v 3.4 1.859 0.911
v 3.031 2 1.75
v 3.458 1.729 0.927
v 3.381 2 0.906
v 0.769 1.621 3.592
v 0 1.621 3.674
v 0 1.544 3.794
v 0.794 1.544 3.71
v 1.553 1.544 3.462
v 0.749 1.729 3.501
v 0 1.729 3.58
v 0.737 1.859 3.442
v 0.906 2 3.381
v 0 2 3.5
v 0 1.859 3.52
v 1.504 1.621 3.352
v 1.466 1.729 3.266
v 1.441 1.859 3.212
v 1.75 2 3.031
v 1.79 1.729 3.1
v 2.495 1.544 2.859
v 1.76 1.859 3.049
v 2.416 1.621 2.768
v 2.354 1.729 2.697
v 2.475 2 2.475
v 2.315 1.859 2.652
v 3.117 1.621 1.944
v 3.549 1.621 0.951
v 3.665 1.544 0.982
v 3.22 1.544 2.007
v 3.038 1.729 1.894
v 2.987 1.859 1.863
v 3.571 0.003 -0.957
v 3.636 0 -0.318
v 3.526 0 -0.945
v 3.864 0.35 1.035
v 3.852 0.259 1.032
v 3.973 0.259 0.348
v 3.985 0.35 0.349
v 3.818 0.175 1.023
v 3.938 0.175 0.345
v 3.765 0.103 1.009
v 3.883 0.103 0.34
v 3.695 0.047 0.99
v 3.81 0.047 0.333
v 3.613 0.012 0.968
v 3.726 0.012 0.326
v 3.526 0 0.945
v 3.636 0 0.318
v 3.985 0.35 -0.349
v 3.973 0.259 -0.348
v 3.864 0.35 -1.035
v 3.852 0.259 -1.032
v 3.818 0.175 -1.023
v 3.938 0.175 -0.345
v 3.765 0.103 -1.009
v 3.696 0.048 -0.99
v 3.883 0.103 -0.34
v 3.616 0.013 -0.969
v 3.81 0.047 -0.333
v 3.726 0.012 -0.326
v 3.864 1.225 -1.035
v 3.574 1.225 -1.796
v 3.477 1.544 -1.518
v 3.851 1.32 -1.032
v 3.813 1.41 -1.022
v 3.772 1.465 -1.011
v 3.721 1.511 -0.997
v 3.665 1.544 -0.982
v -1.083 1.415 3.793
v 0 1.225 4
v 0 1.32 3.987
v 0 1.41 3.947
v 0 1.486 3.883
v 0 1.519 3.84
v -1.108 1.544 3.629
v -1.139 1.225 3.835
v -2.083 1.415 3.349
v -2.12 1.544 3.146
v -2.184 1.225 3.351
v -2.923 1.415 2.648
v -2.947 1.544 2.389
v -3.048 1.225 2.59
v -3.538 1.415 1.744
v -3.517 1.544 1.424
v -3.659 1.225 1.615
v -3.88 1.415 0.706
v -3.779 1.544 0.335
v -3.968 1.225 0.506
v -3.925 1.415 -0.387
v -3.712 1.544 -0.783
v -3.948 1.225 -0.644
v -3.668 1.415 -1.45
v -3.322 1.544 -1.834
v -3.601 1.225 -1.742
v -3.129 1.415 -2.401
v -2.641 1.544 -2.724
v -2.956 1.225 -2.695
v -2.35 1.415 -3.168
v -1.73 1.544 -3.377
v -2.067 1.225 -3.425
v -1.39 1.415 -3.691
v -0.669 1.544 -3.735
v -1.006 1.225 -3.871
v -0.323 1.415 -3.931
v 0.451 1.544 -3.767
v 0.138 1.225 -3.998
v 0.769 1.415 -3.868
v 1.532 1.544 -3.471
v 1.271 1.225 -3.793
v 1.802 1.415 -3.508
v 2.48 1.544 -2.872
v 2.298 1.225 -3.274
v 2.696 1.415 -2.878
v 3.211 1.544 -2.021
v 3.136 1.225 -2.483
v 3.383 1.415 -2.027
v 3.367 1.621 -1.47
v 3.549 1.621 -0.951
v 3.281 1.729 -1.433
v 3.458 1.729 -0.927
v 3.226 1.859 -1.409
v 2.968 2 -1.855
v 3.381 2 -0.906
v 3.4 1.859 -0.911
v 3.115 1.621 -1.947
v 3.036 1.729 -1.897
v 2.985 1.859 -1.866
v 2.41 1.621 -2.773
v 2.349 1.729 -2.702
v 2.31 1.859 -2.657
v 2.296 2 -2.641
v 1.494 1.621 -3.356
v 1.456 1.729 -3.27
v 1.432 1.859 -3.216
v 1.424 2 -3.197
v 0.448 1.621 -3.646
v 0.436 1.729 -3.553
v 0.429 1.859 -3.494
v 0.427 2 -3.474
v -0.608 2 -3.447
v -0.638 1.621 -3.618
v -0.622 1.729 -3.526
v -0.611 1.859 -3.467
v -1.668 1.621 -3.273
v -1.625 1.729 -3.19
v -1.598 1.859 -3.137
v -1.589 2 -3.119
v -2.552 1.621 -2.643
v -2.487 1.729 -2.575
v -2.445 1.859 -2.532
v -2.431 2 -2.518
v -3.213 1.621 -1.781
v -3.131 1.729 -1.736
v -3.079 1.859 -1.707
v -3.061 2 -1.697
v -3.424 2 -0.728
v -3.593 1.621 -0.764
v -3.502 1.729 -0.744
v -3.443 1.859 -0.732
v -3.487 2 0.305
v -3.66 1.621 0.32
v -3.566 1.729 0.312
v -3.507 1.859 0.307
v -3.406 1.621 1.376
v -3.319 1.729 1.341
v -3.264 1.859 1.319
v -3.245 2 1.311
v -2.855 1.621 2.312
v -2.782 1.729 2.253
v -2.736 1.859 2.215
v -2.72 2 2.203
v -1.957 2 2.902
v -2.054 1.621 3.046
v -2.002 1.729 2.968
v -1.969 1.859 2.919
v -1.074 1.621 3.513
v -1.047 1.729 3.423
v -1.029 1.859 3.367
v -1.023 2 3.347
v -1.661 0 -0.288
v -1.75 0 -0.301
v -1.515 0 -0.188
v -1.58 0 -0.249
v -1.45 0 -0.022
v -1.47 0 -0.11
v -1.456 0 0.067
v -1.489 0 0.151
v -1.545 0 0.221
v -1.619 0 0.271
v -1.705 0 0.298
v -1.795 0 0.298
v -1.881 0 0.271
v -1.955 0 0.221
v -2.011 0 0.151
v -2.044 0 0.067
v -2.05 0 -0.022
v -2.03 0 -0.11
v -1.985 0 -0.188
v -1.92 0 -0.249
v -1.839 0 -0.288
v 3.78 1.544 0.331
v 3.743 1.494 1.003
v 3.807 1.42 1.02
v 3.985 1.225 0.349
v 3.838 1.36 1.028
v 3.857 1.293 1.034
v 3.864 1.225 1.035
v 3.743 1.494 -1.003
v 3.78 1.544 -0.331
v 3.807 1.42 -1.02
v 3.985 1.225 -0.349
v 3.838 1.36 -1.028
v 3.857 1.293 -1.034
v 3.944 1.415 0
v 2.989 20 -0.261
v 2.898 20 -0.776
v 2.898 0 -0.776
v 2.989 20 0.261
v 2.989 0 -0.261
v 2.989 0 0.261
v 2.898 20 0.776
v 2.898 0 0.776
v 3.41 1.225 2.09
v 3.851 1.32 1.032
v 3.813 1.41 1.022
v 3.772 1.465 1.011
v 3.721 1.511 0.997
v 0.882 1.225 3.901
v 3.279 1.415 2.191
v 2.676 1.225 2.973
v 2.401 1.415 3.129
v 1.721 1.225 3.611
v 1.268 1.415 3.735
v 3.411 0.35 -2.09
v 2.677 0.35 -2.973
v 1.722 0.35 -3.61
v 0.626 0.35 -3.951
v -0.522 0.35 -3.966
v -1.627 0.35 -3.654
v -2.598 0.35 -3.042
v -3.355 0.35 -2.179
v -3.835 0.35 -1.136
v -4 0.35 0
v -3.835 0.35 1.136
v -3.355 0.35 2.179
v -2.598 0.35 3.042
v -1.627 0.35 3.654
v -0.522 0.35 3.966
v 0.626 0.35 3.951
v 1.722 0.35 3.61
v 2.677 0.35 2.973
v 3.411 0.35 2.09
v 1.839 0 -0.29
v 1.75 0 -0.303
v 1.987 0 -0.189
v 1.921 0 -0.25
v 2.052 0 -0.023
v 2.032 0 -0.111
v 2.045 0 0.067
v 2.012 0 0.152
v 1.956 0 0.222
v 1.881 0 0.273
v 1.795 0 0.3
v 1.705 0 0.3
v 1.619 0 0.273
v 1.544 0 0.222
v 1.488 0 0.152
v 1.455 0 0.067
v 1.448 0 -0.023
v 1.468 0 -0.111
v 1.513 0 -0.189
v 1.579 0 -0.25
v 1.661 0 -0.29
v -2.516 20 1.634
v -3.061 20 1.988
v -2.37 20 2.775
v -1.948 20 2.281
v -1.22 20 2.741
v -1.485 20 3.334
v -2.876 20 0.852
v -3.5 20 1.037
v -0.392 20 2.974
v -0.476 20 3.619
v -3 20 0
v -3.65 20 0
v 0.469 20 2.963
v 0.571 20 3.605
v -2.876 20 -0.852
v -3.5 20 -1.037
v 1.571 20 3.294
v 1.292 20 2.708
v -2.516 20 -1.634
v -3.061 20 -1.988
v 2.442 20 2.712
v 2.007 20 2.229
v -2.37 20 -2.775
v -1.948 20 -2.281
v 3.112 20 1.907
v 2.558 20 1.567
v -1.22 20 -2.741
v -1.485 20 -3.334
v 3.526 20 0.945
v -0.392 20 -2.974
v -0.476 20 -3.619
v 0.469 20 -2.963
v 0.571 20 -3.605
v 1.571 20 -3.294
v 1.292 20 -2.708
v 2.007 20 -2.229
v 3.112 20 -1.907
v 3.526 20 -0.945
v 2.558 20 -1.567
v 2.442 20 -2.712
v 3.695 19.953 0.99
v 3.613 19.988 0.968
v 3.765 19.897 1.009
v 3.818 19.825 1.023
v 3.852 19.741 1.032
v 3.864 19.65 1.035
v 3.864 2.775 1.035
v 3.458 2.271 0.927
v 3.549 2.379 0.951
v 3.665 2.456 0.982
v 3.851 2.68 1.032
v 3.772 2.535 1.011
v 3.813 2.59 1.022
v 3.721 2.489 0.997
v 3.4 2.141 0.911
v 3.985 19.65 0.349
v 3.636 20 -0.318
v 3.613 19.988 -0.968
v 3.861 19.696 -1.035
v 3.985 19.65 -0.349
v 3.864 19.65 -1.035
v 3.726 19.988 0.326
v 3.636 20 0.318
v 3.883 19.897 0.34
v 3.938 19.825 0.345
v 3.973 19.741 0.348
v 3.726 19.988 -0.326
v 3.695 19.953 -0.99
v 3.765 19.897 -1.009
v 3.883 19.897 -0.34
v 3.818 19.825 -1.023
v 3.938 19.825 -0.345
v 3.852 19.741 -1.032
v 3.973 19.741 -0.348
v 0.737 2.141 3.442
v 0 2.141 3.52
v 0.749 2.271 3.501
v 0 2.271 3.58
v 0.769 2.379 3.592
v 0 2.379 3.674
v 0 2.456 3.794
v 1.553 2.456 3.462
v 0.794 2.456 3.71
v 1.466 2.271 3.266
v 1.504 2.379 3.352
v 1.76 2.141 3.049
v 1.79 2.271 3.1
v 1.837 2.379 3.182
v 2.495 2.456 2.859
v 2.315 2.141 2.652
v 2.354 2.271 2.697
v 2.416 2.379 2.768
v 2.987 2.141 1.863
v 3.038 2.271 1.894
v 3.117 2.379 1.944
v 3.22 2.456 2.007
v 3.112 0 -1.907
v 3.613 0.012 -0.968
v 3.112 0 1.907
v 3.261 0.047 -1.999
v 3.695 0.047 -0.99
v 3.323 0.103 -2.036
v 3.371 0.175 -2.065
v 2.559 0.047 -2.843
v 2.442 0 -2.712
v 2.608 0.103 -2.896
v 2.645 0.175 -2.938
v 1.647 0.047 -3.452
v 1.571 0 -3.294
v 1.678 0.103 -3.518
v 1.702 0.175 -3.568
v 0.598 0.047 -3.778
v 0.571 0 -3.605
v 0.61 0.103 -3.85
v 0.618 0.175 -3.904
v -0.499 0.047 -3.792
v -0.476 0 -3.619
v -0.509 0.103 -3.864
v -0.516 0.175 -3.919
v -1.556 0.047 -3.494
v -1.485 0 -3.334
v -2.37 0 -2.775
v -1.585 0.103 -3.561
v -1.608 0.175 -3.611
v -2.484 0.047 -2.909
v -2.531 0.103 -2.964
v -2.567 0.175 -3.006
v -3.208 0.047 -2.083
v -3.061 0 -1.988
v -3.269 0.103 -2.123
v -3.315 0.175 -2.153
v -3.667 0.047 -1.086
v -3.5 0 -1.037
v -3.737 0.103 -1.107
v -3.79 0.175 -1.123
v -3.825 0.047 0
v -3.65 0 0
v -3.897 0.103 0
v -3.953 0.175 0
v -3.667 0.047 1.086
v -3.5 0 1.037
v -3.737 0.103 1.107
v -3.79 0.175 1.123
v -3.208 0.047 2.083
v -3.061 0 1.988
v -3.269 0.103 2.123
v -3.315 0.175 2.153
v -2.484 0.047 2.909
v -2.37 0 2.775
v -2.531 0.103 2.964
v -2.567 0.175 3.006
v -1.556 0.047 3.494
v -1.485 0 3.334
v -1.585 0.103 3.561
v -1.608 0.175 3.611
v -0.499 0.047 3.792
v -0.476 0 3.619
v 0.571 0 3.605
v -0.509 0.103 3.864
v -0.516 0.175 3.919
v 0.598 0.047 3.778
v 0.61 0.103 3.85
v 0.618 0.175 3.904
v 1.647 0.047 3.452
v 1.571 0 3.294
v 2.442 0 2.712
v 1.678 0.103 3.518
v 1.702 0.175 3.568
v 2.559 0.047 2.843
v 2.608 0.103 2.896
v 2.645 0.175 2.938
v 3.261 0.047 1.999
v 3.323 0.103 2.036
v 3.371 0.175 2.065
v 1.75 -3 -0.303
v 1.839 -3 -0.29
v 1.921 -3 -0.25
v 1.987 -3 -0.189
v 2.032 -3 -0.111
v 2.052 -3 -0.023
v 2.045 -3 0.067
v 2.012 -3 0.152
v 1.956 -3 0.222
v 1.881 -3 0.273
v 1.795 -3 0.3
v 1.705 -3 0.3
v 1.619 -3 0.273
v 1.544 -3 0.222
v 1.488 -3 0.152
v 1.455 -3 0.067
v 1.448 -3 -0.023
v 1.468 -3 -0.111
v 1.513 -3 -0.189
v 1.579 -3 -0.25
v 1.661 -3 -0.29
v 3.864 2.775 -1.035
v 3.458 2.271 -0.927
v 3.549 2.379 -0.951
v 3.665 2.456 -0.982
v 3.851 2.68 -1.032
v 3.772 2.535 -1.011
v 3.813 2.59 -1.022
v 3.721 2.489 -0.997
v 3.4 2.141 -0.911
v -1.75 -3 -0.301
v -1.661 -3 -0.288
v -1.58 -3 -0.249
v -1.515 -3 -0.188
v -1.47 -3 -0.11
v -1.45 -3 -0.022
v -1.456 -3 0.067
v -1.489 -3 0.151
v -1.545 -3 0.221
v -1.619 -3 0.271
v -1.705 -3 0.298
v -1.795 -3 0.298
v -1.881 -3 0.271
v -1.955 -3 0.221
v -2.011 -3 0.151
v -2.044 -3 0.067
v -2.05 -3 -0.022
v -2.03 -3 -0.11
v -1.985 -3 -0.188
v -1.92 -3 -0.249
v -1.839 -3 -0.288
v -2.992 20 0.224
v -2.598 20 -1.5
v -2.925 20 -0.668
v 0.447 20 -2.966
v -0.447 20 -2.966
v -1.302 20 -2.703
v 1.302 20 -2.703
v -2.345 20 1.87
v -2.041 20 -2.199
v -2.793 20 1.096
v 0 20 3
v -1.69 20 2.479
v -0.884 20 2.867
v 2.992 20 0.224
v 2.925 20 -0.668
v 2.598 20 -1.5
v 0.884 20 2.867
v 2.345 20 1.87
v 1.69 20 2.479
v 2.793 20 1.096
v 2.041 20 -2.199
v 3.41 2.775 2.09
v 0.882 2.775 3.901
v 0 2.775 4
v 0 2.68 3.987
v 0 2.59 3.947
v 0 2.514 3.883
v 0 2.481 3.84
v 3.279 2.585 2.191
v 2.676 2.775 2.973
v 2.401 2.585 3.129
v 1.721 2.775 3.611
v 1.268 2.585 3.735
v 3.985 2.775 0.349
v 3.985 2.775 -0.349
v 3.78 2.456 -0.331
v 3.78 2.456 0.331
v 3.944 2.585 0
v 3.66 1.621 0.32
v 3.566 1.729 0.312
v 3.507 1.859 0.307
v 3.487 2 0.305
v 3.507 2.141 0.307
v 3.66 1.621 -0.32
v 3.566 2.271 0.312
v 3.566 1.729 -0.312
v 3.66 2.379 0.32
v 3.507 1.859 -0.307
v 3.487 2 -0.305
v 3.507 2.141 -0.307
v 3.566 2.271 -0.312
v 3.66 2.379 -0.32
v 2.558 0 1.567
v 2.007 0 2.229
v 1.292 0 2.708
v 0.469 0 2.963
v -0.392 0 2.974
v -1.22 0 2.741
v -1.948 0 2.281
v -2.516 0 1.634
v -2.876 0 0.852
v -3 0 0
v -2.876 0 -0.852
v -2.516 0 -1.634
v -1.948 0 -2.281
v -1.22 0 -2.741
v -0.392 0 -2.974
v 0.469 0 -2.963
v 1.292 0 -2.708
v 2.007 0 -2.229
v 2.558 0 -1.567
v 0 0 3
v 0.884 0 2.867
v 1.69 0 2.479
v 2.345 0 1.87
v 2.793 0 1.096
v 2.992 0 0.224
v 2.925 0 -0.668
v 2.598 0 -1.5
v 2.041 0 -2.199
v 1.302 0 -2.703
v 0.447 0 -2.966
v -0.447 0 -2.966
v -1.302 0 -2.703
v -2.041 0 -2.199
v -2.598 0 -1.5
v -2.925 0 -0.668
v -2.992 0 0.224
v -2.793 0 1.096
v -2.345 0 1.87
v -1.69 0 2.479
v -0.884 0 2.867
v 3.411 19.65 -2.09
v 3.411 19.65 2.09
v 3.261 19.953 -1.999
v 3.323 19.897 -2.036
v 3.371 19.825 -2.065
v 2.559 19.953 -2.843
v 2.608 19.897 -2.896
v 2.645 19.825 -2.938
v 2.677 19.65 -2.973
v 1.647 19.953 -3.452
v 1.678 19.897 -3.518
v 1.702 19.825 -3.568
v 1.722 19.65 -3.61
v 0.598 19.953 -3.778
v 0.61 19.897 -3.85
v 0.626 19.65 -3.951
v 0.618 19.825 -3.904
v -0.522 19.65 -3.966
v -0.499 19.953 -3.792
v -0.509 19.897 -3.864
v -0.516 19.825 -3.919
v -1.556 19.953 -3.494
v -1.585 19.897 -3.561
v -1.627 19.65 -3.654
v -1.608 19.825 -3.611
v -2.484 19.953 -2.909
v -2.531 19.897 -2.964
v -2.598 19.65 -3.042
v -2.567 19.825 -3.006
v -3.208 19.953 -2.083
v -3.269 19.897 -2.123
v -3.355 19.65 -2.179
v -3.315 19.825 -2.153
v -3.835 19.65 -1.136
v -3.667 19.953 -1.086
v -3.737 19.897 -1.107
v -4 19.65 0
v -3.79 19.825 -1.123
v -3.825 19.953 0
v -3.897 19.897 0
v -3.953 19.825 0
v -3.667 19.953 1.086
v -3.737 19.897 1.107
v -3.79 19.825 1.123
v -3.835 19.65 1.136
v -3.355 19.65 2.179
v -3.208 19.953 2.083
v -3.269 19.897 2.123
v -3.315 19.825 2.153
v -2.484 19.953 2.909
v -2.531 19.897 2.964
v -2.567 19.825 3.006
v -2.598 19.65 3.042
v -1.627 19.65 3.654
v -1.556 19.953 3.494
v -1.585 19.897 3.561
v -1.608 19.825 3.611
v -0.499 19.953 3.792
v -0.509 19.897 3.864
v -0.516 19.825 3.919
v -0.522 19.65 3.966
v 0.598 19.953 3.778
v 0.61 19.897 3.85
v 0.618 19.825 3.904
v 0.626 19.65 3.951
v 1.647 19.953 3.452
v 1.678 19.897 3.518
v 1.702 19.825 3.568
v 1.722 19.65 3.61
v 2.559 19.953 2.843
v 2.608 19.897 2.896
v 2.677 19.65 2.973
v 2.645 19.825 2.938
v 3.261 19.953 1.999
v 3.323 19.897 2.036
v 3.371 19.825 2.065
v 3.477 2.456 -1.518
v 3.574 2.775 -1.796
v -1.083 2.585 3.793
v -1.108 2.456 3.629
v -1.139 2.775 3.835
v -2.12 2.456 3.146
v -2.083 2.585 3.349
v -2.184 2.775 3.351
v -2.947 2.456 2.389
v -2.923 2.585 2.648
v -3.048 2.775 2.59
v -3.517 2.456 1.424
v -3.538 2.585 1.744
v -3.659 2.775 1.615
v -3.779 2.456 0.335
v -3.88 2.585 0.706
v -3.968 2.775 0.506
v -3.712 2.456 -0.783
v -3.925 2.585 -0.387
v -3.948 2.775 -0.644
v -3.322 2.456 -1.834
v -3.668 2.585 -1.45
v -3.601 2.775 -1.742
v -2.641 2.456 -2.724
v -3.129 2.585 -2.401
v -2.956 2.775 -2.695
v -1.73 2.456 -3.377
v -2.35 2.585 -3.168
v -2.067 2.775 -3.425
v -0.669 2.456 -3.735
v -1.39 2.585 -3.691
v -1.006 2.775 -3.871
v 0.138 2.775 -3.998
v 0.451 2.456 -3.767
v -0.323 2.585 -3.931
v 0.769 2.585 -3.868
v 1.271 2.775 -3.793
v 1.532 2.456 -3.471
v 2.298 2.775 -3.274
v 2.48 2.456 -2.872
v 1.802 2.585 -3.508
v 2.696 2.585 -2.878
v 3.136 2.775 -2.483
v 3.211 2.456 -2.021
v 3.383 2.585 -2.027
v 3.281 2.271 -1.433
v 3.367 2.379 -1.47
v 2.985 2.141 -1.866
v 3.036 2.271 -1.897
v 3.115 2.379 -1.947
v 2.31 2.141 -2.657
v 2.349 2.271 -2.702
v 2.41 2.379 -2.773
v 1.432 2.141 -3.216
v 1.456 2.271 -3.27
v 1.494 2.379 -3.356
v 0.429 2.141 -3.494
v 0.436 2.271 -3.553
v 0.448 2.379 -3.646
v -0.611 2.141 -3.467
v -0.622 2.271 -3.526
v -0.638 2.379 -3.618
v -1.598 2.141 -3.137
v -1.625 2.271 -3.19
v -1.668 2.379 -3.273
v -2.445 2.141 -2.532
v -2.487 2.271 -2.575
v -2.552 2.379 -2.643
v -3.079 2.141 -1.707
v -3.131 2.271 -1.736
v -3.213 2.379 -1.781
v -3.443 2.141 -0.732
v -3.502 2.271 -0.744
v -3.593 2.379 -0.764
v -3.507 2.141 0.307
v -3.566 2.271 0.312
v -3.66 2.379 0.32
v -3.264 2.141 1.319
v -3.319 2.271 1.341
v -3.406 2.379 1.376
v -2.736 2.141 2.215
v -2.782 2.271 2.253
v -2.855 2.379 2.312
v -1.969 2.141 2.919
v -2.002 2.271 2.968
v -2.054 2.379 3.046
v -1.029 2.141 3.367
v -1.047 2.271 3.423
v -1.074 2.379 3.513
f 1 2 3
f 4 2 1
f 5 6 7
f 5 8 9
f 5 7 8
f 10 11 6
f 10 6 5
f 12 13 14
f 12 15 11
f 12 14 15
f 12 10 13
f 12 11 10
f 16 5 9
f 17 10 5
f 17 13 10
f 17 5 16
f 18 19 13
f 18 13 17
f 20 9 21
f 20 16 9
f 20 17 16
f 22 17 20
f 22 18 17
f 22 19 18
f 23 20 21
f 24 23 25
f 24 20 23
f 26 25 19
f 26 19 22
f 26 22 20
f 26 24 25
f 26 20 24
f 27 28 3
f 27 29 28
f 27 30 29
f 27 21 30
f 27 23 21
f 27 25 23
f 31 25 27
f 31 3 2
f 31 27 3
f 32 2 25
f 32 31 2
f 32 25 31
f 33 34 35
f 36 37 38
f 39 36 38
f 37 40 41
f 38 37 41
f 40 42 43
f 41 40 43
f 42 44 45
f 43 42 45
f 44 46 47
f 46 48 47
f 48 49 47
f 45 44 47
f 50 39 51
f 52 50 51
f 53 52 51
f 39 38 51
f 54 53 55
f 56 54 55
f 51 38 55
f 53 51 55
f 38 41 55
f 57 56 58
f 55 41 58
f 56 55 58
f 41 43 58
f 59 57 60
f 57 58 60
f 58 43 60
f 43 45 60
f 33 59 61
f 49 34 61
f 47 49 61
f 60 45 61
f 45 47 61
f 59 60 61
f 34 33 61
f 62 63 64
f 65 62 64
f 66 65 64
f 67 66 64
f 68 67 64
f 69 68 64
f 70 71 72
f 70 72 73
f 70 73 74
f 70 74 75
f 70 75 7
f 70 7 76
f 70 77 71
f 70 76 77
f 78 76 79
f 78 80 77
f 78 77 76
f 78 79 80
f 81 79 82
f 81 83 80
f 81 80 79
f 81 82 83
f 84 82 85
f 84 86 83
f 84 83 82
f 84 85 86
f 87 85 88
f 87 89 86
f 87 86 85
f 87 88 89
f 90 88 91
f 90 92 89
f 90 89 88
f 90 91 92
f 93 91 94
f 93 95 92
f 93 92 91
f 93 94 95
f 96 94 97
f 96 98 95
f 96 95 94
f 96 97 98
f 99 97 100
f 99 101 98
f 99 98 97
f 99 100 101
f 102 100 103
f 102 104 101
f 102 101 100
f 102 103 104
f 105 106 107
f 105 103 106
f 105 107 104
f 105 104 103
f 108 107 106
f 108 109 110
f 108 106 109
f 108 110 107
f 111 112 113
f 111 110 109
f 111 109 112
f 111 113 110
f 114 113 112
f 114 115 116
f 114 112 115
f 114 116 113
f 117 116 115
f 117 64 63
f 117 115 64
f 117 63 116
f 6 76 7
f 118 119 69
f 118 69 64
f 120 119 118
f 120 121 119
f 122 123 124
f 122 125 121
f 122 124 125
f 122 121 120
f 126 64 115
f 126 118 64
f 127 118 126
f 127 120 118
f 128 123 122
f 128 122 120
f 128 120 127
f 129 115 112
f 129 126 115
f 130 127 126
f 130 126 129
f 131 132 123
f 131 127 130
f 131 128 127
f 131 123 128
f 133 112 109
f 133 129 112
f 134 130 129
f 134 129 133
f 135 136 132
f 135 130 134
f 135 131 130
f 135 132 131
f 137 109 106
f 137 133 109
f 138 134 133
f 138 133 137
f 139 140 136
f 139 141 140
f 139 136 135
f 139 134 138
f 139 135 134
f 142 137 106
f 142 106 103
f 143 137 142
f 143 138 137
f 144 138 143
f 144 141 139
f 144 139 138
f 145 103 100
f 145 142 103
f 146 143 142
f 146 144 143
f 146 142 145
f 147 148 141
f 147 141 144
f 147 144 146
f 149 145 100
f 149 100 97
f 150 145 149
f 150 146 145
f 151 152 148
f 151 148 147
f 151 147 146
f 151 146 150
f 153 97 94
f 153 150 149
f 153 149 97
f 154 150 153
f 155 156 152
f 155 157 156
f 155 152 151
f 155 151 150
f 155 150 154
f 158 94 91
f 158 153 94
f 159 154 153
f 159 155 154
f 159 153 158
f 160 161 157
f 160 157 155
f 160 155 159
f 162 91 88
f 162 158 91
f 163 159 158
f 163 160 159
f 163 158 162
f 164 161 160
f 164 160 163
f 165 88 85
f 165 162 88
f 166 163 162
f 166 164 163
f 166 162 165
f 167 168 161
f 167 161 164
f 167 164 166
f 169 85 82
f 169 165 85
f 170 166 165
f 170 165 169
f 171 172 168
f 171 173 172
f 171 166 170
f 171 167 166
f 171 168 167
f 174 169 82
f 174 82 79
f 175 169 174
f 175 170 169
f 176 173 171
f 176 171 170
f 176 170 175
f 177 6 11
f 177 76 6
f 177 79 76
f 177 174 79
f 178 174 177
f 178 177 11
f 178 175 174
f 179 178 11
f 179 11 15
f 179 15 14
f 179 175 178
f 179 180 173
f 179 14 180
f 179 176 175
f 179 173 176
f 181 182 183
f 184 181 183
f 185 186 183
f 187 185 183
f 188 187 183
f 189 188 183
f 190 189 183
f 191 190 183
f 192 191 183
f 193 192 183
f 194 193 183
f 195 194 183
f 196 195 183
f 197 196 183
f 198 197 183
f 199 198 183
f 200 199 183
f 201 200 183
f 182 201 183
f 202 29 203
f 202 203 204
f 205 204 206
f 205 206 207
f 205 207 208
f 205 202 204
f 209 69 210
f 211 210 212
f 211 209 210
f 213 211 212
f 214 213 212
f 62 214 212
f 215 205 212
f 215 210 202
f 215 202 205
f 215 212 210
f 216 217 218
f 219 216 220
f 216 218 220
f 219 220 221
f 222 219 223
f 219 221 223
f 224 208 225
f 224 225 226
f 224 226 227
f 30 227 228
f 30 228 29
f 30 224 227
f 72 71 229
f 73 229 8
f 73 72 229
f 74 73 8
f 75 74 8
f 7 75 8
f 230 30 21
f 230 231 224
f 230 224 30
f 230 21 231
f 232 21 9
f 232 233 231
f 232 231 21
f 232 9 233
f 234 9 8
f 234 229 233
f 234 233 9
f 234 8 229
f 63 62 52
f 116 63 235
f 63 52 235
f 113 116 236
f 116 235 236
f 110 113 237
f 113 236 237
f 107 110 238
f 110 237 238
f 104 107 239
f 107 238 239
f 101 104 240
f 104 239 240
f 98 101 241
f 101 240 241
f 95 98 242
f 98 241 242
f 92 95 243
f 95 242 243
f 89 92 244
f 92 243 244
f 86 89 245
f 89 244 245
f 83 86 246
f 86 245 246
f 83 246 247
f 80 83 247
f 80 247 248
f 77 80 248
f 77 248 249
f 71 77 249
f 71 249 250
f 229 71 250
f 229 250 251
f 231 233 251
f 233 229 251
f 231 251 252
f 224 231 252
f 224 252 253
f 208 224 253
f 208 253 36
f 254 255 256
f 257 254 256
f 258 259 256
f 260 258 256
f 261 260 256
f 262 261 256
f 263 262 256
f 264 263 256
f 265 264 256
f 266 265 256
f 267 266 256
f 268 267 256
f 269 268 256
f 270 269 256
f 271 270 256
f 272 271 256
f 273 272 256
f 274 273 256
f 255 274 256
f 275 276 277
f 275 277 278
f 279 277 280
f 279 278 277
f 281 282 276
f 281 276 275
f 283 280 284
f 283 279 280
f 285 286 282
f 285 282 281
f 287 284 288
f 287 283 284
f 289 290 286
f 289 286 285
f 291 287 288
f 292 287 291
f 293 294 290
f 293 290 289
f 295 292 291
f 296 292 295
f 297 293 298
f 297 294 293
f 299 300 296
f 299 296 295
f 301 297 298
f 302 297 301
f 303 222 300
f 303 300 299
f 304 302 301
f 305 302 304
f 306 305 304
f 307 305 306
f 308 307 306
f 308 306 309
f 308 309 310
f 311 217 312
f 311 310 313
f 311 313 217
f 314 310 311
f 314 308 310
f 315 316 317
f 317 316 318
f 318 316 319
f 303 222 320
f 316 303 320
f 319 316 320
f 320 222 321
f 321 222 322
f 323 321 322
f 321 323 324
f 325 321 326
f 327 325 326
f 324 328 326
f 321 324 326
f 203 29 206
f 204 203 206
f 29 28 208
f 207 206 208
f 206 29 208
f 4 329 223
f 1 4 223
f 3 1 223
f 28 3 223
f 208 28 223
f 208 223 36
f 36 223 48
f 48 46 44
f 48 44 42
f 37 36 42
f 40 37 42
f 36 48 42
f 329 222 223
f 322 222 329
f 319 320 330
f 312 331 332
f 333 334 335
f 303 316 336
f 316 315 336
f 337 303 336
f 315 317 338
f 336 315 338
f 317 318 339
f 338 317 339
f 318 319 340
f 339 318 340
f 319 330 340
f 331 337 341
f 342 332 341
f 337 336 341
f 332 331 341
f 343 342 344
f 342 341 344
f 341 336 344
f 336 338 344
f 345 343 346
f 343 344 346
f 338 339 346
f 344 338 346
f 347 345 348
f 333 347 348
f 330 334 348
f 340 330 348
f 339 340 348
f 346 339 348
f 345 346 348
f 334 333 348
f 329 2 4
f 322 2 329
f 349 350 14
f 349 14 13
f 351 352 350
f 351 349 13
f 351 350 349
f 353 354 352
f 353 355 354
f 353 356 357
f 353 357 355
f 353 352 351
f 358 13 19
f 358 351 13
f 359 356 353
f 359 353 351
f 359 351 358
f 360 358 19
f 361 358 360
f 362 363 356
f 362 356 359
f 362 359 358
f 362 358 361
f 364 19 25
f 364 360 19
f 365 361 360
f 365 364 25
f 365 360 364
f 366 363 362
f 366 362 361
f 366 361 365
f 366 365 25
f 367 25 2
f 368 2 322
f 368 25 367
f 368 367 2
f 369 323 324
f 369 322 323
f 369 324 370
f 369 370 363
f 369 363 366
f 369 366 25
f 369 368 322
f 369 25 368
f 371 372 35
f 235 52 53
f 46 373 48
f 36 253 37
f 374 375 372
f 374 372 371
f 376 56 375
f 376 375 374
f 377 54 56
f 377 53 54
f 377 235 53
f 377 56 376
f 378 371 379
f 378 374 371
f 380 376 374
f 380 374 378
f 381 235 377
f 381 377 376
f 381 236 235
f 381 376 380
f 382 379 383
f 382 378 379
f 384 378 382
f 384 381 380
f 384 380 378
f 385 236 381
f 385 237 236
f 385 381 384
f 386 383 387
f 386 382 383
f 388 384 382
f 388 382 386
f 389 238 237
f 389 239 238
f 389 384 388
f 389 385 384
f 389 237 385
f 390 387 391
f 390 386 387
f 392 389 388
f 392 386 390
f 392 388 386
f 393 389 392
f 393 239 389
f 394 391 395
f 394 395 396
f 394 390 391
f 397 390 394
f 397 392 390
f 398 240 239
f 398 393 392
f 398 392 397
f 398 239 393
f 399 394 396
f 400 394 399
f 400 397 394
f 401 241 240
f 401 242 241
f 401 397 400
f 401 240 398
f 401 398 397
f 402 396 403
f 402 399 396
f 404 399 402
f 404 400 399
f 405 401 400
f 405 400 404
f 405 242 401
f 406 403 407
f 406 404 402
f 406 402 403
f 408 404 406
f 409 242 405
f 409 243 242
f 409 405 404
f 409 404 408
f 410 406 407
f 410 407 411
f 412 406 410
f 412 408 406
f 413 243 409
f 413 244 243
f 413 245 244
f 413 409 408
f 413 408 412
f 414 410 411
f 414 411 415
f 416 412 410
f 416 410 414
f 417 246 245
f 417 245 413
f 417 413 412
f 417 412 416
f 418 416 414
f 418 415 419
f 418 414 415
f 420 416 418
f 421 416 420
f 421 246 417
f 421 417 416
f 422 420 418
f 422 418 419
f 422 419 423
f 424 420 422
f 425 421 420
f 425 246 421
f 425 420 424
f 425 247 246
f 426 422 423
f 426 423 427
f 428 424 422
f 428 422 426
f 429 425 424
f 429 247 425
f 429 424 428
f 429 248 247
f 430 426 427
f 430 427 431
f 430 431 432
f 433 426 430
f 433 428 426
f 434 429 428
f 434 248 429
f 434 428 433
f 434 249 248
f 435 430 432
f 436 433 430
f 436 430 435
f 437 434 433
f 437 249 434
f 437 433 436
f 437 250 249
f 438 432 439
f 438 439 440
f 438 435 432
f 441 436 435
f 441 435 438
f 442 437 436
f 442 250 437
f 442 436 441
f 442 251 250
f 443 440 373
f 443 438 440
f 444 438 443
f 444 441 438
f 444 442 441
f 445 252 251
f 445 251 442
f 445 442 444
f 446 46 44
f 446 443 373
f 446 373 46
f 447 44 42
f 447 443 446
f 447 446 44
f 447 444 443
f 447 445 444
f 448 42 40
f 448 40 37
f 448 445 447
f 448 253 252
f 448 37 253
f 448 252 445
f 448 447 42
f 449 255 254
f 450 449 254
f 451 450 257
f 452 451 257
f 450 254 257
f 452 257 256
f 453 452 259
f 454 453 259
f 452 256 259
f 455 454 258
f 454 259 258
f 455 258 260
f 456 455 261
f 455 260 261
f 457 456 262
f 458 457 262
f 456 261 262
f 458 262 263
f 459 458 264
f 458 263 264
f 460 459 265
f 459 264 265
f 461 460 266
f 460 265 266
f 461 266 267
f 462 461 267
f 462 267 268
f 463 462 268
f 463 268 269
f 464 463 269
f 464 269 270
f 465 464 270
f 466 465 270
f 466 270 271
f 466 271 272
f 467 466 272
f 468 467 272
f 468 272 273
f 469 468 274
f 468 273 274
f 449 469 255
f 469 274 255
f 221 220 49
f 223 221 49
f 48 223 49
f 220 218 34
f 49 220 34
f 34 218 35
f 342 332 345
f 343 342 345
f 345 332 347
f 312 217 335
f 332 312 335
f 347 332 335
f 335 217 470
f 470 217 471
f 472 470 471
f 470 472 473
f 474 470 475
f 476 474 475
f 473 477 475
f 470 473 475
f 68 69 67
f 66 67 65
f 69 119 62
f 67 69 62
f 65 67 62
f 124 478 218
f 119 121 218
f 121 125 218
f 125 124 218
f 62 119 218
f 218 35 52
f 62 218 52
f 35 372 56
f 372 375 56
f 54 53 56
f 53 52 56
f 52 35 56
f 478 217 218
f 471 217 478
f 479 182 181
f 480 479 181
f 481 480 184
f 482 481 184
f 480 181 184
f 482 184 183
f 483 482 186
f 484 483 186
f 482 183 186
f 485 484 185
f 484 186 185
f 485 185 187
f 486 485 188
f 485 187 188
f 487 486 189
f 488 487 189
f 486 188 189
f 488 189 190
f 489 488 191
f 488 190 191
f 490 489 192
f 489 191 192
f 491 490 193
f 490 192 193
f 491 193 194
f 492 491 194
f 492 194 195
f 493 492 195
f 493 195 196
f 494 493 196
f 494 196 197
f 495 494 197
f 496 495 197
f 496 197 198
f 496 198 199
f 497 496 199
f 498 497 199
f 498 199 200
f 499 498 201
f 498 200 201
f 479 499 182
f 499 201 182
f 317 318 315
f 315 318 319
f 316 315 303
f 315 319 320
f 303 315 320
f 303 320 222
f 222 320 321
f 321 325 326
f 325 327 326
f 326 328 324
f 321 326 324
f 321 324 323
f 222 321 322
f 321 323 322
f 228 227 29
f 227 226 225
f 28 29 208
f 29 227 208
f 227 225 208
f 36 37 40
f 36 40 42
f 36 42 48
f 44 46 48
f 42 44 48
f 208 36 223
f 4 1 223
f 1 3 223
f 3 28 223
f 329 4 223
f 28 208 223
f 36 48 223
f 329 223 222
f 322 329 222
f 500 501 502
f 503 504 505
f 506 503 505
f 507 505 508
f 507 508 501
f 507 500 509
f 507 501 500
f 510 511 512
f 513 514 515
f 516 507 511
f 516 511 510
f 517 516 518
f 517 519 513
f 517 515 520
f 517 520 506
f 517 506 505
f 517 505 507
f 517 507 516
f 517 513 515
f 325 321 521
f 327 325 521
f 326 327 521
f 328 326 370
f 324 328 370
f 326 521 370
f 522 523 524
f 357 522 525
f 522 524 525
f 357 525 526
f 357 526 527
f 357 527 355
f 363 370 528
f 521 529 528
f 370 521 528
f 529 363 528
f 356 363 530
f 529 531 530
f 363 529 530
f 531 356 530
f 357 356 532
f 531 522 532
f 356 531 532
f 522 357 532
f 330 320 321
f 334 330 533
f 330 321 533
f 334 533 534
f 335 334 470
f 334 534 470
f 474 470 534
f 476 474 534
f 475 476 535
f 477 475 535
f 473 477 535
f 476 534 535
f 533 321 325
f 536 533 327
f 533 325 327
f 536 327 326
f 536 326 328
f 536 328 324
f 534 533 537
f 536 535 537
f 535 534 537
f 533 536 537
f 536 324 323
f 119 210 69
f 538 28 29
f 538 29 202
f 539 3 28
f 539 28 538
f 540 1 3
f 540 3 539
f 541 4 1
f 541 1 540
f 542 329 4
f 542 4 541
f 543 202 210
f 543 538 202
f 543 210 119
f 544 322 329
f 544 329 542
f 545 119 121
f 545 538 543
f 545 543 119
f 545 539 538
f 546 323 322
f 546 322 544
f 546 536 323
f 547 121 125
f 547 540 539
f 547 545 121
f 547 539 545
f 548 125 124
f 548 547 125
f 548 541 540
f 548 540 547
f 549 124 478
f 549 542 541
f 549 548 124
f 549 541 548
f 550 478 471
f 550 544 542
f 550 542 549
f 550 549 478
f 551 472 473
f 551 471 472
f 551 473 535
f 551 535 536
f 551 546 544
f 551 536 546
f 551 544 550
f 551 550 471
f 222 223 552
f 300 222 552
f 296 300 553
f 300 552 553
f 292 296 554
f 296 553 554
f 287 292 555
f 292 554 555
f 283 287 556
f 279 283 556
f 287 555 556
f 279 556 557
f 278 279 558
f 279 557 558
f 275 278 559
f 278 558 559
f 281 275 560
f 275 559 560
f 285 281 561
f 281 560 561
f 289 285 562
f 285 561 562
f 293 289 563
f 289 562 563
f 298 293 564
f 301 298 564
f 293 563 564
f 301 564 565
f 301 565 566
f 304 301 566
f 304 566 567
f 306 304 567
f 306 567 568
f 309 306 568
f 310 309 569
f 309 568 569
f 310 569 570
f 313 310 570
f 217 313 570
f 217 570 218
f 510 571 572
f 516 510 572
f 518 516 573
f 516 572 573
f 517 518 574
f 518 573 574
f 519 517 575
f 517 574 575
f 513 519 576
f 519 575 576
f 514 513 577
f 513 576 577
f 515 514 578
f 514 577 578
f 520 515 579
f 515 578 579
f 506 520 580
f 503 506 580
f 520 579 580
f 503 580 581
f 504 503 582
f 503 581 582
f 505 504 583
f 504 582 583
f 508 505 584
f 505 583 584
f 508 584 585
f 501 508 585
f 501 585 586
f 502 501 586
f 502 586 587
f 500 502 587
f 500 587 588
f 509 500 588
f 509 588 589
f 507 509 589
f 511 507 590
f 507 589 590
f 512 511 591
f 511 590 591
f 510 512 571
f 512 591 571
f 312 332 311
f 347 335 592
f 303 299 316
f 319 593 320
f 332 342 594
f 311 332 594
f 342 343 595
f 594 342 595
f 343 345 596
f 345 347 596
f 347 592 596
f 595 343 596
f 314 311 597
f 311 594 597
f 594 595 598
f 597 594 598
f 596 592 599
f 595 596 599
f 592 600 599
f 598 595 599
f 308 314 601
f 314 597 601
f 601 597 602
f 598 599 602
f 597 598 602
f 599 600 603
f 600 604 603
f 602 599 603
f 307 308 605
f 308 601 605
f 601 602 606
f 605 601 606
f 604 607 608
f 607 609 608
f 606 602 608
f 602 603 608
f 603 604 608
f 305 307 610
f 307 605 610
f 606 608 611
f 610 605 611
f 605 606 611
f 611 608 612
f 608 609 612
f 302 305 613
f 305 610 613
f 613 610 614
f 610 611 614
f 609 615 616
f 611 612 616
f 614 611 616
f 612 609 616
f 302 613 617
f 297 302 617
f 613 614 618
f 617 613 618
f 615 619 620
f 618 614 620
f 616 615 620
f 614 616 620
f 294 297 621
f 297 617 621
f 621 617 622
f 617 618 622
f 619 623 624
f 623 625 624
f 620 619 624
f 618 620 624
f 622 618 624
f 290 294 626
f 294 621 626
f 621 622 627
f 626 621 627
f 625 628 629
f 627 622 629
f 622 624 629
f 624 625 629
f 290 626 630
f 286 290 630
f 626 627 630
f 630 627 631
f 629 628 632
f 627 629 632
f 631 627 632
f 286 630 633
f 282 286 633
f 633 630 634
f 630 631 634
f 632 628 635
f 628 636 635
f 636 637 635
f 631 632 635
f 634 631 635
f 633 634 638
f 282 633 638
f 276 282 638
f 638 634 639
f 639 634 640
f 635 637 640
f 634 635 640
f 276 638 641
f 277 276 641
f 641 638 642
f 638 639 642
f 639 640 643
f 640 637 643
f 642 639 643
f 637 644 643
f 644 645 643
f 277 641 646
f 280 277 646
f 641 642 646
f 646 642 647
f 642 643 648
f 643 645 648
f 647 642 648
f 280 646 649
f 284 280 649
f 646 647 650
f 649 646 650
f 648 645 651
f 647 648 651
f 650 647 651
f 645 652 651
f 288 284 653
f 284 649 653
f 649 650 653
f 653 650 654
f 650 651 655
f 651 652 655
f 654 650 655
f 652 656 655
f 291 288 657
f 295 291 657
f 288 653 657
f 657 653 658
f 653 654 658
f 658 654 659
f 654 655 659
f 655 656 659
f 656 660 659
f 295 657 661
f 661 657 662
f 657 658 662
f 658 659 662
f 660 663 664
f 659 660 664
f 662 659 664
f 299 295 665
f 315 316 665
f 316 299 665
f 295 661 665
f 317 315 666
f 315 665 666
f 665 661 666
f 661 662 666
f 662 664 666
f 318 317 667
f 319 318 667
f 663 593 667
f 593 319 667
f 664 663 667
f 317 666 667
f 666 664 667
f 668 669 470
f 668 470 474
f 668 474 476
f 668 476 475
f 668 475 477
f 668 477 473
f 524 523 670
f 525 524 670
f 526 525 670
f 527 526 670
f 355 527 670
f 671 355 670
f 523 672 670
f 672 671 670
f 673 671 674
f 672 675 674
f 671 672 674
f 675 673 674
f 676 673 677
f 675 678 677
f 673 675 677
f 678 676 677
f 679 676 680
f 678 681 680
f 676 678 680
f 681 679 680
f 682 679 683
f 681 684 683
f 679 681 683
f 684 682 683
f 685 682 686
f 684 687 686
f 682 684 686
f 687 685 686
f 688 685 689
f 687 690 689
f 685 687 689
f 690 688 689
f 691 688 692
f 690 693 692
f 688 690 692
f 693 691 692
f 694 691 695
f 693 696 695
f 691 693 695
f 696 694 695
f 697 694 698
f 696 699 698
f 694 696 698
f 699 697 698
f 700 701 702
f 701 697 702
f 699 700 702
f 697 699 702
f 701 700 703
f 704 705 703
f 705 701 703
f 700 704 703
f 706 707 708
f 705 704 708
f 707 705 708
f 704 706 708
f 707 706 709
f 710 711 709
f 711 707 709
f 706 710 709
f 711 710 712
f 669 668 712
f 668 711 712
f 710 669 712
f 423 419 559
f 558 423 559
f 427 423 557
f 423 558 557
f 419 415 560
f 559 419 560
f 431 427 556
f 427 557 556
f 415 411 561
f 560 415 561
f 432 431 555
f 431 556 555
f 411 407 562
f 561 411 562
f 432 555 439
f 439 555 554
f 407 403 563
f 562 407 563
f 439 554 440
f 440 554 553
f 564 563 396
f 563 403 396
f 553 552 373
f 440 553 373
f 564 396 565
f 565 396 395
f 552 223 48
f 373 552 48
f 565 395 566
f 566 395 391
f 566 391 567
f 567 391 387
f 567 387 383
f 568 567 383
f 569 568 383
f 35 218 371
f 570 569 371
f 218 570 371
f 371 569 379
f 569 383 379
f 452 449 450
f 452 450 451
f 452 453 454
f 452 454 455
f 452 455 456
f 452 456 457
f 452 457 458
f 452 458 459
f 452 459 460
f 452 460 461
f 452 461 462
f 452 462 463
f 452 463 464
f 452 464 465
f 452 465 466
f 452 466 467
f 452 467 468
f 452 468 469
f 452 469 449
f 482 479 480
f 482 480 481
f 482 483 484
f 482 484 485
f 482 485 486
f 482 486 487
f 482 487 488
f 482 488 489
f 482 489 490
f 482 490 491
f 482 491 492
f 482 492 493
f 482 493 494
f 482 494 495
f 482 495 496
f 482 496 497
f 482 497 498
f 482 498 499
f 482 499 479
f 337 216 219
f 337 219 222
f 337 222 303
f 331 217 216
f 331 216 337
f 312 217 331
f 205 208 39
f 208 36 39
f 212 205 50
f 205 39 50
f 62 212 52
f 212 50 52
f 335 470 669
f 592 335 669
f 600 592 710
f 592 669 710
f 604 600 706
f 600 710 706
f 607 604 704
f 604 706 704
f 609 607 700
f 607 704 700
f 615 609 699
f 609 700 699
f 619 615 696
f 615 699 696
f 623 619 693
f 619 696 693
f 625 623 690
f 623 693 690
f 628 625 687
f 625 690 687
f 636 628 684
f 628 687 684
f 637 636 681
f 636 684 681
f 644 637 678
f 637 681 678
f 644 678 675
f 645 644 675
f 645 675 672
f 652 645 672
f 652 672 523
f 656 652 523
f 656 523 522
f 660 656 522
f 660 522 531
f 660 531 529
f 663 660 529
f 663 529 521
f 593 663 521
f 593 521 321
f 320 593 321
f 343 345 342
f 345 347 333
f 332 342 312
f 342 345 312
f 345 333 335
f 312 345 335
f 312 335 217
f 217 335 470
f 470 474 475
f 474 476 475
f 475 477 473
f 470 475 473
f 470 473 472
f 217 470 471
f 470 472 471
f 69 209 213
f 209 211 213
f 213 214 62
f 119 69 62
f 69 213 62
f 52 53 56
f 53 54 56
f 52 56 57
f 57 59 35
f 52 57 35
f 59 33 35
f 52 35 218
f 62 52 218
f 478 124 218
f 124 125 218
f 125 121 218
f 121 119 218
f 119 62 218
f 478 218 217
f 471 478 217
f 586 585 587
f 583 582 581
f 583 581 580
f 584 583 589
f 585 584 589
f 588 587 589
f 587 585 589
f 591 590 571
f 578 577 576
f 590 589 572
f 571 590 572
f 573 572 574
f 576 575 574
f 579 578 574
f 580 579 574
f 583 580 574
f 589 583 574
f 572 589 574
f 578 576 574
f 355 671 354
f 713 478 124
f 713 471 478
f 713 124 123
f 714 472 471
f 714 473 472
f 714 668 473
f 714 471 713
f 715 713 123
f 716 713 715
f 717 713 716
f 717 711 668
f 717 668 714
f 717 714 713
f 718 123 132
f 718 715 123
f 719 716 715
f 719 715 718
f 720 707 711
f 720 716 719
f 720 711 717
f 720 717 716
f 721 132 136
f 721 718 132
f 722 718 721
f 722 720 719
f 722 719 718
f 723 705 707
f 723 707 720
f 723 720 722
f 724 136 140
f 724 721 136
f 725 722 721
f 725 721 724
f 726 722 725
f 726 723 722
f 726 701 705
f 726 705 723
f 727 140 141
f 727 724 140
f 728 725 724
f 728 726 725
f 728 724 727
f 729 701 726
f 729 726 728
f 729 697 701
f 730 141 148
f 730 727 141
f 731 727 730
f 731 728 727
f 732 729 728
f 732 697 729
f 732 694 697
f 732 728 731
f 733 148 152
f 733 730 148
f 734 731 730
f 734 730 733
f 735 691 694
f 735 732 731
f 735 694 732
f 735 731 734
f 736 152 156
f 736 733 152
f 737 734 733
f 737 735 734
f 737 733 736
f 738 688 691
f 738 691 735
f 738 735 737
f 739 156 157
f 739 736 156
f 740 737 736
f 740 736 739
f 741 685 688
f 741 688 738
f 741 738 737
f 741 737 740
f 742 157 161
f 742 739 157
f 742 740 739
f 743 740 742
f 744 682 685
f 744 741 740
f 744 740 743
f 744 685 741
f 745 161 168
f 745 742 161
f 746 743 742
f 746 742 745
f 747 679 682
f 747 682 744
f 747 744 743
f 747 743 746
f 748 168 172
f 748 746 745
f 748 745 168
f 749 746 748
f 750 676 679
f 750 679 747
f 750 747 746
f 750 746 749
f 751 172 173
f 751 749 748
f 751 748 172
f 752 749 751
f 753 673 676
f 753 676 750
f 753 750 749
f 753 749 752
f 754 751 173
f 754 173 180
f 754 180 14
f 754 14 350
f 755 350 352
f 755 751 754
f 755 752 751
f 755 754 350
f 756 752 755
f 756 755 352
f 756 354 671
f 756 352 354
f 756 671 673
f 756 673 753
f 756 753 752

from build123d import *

# Parameters (mm, degrees)
SALIENTE_EXTRUIR3_DEPTH   = 20
SALIENTE_EXTRUIR4_DEPTH   = 20
SALIENTE_EXTRUIR5_DEPTH   = 20
CROQUIS3_R                = 0.4999999999999999
REDONDEO1_R               = 0.35
REDONDEO2_R               = 0.35
CROQUIS4_R                = 0.30107653954551516
SALIENTE_EXTRUIR6_DEPTH   = 3
CROQUIS4_R_2              = 0.30302467240714076
SALIENTE_EXTRUIR6_2_DEPTH = 3


with BuildPart() as part:
    # Croquis1 → Saliente-Extruir3 (new body)
    with BuildSketch(Plane(origin=(0, 0, 0), x_dir=(1, 0, 0), z_dir=(0, 1, 0))):
        with BuildLine():
            Line((3.8637033051562724, 1.0352761804100858), (2.8977774788672046, 0.7764571353075645))
            ThreePointArc((2.897777478867204, 0.7764571353075644), (2.974334584121431, 0.3915785766601559), (3, 0))
            ThreePointArc((3, -7.3e-16), (2.974334584121431, -0.3915785766601577), (2.897777478867204, -0.7764571353075647))
            Line((2.8977774788672046, -0.7764571353075641), (3.8637033051562724, -1.0352761804100854))
            ThreePointArc((3.8637033051562724, -1.0352761804100863), (3.965779445495241, -0.5221047688802103), (4, -9.8e-16))
            ThreePointArc((4, 0), (3.9657794454952415, 0.5221047688802078), (3.8637033051562724, 1.0352761804100858))
        make_face()
    extrude(amount=SALIENTE_EXTRUIR3_DEPTH)


with BuildPart() as body_2:
    # Croquis1<5> → Saliente-Extruir4 (new body)
    with BuildSketch(Plane(origin=(0, 0, 0), x_dir=(1, 0, 0), z_dir=(0, 1, 0))):
        with BuildLine():
            ThreePointArc((3, 0), (2.974334584121431, 0.3915785766601559), (2.897777478867204, 0.7764571353075644))
            ThreePointArc((2.897777478867204, 0.7764571353075644), (-3, -9.6e-16), (2.897777478867205, -0.776457135307562))
            ThreePointArc((2.897777478867204, -0.7764571353075647), (2.974334584121431, -0.3915785766601577), (3, -7.3e-16))
        make_face()
    extrude(amount=SALIENTE_EXTRUIR4_DEPTH)


with BuildPart() as body_3:
    # Croquis1<6> → Saliente-Extruir5 (new body)
    with BuildSketch(Plane(origin=(0, 0, 0), x_dir=(1, 0, 0), z_dir=(0, 1, 0))):
        with BuildLine():
            ThreePointArc((2.897777478867205, -0.776457135307562), (-3, -9.6e-16), (2.897777478867204, 0.7764571353075644))
            Line((2.8977774788672046, 0.7764571353075645), (3.8637033051562724, 1.0352761804100858))
            ThreePointArc((3.8637033051562724, 1.0352761804100858), (-4, 4.9e-16), (3.8637033051562724, -1.0352761804100863))
            Line((3.8637033051562724, -1.0352761804100854), (2.8977774788672046, -0.7764571353075641))
        make_face()
    extrude(amount=SALIENTE_EXTRUIR5_DEPTH)


with BuildPart() as cortar_revoluci_n1_tool:
    # Croquis3 → Cortar-Revolución1 (revolve)
    with BuildSketch(Plane(origin=(0, 0, 0), x_dir=(0, 0, -1), z_dir=(1, 0, 0))):
        with Locations((-4, 1.9999999999999982)):
            Circle(CROQUIS3_R)
    revolve(axis=Axis((0, -1.7359986127882774, 0), (0, 1, 0)))


with BuildPart() as part_1:
    add(part.part)

    # Cortar-Revolución1: cut by cortar_revoluci_n1_tool
    add(cortar_revoluci_n1_tool.part, mode=Mode.SUBTRACT)

    # Redondeo2
    redondeo2_edges = [part_1.edges().sort_by_distance(p)[0] for p in [
        (4, 0, -4.7e-16),
        (3.999999999997482, 1.4999999999999982, -7.0699e-12),
        (3.999999999997482, 2.4999999999999982, 7.09233e-12),
        (4.000000000000001, 20, 6.7e-16),
    ]]
    fillet(redondeo2_edges, radius=REDONDEO2_R)


with BuildPart() as body_3_1:
    add(body_3.part)

    # Cortar-Revolución1: cut by cortar_revoluci_n1_tool
    add(cortar_revoluci_n1_tool.part, mode=Mode.SUBTRACT)

    # Redondeo1
    redondeo1_edges = [body_3_1.edges().sort_by_distance(p)[0] for p in [
        (-4, 0, 6.55e-15),
        (-3.1734133611649407, 1.4999999999999982, -2.435045716034882),
        (-3.1734133611649407, 2.4999999999999982, -2.435045716034882),
        (-4, 20, 6.55e-15),
    ]]
    fillet(redondeo1_edges, radius=REDONDEO1_R)


with BuildPart() as body_4:
    # Croquis4 → Saliente-Extruir6 (new body)
    with BuildSketch(Plane.XZ):
        with Locations((-1.75, 0)):
            Circle(CROQUIS4_R)
    extrude(amount=SALIENTE_EXTRUIR6_DEPTH)


with BuildPart() as body_5:
    # Croquis4 → Saliente-Extruir6 2 (new body)
    with BuildSketch(Plane.XZ):
        with Locations((1.75, 0)):
            Circle(CROQUIS4_R_2)
    extrude(amount=SALIENTE_EXTRUIR6_2_DEPTH)


solid = Compound([body_2.part, part_1.part, body_3_1.part, body_4.part, body_5.part])
